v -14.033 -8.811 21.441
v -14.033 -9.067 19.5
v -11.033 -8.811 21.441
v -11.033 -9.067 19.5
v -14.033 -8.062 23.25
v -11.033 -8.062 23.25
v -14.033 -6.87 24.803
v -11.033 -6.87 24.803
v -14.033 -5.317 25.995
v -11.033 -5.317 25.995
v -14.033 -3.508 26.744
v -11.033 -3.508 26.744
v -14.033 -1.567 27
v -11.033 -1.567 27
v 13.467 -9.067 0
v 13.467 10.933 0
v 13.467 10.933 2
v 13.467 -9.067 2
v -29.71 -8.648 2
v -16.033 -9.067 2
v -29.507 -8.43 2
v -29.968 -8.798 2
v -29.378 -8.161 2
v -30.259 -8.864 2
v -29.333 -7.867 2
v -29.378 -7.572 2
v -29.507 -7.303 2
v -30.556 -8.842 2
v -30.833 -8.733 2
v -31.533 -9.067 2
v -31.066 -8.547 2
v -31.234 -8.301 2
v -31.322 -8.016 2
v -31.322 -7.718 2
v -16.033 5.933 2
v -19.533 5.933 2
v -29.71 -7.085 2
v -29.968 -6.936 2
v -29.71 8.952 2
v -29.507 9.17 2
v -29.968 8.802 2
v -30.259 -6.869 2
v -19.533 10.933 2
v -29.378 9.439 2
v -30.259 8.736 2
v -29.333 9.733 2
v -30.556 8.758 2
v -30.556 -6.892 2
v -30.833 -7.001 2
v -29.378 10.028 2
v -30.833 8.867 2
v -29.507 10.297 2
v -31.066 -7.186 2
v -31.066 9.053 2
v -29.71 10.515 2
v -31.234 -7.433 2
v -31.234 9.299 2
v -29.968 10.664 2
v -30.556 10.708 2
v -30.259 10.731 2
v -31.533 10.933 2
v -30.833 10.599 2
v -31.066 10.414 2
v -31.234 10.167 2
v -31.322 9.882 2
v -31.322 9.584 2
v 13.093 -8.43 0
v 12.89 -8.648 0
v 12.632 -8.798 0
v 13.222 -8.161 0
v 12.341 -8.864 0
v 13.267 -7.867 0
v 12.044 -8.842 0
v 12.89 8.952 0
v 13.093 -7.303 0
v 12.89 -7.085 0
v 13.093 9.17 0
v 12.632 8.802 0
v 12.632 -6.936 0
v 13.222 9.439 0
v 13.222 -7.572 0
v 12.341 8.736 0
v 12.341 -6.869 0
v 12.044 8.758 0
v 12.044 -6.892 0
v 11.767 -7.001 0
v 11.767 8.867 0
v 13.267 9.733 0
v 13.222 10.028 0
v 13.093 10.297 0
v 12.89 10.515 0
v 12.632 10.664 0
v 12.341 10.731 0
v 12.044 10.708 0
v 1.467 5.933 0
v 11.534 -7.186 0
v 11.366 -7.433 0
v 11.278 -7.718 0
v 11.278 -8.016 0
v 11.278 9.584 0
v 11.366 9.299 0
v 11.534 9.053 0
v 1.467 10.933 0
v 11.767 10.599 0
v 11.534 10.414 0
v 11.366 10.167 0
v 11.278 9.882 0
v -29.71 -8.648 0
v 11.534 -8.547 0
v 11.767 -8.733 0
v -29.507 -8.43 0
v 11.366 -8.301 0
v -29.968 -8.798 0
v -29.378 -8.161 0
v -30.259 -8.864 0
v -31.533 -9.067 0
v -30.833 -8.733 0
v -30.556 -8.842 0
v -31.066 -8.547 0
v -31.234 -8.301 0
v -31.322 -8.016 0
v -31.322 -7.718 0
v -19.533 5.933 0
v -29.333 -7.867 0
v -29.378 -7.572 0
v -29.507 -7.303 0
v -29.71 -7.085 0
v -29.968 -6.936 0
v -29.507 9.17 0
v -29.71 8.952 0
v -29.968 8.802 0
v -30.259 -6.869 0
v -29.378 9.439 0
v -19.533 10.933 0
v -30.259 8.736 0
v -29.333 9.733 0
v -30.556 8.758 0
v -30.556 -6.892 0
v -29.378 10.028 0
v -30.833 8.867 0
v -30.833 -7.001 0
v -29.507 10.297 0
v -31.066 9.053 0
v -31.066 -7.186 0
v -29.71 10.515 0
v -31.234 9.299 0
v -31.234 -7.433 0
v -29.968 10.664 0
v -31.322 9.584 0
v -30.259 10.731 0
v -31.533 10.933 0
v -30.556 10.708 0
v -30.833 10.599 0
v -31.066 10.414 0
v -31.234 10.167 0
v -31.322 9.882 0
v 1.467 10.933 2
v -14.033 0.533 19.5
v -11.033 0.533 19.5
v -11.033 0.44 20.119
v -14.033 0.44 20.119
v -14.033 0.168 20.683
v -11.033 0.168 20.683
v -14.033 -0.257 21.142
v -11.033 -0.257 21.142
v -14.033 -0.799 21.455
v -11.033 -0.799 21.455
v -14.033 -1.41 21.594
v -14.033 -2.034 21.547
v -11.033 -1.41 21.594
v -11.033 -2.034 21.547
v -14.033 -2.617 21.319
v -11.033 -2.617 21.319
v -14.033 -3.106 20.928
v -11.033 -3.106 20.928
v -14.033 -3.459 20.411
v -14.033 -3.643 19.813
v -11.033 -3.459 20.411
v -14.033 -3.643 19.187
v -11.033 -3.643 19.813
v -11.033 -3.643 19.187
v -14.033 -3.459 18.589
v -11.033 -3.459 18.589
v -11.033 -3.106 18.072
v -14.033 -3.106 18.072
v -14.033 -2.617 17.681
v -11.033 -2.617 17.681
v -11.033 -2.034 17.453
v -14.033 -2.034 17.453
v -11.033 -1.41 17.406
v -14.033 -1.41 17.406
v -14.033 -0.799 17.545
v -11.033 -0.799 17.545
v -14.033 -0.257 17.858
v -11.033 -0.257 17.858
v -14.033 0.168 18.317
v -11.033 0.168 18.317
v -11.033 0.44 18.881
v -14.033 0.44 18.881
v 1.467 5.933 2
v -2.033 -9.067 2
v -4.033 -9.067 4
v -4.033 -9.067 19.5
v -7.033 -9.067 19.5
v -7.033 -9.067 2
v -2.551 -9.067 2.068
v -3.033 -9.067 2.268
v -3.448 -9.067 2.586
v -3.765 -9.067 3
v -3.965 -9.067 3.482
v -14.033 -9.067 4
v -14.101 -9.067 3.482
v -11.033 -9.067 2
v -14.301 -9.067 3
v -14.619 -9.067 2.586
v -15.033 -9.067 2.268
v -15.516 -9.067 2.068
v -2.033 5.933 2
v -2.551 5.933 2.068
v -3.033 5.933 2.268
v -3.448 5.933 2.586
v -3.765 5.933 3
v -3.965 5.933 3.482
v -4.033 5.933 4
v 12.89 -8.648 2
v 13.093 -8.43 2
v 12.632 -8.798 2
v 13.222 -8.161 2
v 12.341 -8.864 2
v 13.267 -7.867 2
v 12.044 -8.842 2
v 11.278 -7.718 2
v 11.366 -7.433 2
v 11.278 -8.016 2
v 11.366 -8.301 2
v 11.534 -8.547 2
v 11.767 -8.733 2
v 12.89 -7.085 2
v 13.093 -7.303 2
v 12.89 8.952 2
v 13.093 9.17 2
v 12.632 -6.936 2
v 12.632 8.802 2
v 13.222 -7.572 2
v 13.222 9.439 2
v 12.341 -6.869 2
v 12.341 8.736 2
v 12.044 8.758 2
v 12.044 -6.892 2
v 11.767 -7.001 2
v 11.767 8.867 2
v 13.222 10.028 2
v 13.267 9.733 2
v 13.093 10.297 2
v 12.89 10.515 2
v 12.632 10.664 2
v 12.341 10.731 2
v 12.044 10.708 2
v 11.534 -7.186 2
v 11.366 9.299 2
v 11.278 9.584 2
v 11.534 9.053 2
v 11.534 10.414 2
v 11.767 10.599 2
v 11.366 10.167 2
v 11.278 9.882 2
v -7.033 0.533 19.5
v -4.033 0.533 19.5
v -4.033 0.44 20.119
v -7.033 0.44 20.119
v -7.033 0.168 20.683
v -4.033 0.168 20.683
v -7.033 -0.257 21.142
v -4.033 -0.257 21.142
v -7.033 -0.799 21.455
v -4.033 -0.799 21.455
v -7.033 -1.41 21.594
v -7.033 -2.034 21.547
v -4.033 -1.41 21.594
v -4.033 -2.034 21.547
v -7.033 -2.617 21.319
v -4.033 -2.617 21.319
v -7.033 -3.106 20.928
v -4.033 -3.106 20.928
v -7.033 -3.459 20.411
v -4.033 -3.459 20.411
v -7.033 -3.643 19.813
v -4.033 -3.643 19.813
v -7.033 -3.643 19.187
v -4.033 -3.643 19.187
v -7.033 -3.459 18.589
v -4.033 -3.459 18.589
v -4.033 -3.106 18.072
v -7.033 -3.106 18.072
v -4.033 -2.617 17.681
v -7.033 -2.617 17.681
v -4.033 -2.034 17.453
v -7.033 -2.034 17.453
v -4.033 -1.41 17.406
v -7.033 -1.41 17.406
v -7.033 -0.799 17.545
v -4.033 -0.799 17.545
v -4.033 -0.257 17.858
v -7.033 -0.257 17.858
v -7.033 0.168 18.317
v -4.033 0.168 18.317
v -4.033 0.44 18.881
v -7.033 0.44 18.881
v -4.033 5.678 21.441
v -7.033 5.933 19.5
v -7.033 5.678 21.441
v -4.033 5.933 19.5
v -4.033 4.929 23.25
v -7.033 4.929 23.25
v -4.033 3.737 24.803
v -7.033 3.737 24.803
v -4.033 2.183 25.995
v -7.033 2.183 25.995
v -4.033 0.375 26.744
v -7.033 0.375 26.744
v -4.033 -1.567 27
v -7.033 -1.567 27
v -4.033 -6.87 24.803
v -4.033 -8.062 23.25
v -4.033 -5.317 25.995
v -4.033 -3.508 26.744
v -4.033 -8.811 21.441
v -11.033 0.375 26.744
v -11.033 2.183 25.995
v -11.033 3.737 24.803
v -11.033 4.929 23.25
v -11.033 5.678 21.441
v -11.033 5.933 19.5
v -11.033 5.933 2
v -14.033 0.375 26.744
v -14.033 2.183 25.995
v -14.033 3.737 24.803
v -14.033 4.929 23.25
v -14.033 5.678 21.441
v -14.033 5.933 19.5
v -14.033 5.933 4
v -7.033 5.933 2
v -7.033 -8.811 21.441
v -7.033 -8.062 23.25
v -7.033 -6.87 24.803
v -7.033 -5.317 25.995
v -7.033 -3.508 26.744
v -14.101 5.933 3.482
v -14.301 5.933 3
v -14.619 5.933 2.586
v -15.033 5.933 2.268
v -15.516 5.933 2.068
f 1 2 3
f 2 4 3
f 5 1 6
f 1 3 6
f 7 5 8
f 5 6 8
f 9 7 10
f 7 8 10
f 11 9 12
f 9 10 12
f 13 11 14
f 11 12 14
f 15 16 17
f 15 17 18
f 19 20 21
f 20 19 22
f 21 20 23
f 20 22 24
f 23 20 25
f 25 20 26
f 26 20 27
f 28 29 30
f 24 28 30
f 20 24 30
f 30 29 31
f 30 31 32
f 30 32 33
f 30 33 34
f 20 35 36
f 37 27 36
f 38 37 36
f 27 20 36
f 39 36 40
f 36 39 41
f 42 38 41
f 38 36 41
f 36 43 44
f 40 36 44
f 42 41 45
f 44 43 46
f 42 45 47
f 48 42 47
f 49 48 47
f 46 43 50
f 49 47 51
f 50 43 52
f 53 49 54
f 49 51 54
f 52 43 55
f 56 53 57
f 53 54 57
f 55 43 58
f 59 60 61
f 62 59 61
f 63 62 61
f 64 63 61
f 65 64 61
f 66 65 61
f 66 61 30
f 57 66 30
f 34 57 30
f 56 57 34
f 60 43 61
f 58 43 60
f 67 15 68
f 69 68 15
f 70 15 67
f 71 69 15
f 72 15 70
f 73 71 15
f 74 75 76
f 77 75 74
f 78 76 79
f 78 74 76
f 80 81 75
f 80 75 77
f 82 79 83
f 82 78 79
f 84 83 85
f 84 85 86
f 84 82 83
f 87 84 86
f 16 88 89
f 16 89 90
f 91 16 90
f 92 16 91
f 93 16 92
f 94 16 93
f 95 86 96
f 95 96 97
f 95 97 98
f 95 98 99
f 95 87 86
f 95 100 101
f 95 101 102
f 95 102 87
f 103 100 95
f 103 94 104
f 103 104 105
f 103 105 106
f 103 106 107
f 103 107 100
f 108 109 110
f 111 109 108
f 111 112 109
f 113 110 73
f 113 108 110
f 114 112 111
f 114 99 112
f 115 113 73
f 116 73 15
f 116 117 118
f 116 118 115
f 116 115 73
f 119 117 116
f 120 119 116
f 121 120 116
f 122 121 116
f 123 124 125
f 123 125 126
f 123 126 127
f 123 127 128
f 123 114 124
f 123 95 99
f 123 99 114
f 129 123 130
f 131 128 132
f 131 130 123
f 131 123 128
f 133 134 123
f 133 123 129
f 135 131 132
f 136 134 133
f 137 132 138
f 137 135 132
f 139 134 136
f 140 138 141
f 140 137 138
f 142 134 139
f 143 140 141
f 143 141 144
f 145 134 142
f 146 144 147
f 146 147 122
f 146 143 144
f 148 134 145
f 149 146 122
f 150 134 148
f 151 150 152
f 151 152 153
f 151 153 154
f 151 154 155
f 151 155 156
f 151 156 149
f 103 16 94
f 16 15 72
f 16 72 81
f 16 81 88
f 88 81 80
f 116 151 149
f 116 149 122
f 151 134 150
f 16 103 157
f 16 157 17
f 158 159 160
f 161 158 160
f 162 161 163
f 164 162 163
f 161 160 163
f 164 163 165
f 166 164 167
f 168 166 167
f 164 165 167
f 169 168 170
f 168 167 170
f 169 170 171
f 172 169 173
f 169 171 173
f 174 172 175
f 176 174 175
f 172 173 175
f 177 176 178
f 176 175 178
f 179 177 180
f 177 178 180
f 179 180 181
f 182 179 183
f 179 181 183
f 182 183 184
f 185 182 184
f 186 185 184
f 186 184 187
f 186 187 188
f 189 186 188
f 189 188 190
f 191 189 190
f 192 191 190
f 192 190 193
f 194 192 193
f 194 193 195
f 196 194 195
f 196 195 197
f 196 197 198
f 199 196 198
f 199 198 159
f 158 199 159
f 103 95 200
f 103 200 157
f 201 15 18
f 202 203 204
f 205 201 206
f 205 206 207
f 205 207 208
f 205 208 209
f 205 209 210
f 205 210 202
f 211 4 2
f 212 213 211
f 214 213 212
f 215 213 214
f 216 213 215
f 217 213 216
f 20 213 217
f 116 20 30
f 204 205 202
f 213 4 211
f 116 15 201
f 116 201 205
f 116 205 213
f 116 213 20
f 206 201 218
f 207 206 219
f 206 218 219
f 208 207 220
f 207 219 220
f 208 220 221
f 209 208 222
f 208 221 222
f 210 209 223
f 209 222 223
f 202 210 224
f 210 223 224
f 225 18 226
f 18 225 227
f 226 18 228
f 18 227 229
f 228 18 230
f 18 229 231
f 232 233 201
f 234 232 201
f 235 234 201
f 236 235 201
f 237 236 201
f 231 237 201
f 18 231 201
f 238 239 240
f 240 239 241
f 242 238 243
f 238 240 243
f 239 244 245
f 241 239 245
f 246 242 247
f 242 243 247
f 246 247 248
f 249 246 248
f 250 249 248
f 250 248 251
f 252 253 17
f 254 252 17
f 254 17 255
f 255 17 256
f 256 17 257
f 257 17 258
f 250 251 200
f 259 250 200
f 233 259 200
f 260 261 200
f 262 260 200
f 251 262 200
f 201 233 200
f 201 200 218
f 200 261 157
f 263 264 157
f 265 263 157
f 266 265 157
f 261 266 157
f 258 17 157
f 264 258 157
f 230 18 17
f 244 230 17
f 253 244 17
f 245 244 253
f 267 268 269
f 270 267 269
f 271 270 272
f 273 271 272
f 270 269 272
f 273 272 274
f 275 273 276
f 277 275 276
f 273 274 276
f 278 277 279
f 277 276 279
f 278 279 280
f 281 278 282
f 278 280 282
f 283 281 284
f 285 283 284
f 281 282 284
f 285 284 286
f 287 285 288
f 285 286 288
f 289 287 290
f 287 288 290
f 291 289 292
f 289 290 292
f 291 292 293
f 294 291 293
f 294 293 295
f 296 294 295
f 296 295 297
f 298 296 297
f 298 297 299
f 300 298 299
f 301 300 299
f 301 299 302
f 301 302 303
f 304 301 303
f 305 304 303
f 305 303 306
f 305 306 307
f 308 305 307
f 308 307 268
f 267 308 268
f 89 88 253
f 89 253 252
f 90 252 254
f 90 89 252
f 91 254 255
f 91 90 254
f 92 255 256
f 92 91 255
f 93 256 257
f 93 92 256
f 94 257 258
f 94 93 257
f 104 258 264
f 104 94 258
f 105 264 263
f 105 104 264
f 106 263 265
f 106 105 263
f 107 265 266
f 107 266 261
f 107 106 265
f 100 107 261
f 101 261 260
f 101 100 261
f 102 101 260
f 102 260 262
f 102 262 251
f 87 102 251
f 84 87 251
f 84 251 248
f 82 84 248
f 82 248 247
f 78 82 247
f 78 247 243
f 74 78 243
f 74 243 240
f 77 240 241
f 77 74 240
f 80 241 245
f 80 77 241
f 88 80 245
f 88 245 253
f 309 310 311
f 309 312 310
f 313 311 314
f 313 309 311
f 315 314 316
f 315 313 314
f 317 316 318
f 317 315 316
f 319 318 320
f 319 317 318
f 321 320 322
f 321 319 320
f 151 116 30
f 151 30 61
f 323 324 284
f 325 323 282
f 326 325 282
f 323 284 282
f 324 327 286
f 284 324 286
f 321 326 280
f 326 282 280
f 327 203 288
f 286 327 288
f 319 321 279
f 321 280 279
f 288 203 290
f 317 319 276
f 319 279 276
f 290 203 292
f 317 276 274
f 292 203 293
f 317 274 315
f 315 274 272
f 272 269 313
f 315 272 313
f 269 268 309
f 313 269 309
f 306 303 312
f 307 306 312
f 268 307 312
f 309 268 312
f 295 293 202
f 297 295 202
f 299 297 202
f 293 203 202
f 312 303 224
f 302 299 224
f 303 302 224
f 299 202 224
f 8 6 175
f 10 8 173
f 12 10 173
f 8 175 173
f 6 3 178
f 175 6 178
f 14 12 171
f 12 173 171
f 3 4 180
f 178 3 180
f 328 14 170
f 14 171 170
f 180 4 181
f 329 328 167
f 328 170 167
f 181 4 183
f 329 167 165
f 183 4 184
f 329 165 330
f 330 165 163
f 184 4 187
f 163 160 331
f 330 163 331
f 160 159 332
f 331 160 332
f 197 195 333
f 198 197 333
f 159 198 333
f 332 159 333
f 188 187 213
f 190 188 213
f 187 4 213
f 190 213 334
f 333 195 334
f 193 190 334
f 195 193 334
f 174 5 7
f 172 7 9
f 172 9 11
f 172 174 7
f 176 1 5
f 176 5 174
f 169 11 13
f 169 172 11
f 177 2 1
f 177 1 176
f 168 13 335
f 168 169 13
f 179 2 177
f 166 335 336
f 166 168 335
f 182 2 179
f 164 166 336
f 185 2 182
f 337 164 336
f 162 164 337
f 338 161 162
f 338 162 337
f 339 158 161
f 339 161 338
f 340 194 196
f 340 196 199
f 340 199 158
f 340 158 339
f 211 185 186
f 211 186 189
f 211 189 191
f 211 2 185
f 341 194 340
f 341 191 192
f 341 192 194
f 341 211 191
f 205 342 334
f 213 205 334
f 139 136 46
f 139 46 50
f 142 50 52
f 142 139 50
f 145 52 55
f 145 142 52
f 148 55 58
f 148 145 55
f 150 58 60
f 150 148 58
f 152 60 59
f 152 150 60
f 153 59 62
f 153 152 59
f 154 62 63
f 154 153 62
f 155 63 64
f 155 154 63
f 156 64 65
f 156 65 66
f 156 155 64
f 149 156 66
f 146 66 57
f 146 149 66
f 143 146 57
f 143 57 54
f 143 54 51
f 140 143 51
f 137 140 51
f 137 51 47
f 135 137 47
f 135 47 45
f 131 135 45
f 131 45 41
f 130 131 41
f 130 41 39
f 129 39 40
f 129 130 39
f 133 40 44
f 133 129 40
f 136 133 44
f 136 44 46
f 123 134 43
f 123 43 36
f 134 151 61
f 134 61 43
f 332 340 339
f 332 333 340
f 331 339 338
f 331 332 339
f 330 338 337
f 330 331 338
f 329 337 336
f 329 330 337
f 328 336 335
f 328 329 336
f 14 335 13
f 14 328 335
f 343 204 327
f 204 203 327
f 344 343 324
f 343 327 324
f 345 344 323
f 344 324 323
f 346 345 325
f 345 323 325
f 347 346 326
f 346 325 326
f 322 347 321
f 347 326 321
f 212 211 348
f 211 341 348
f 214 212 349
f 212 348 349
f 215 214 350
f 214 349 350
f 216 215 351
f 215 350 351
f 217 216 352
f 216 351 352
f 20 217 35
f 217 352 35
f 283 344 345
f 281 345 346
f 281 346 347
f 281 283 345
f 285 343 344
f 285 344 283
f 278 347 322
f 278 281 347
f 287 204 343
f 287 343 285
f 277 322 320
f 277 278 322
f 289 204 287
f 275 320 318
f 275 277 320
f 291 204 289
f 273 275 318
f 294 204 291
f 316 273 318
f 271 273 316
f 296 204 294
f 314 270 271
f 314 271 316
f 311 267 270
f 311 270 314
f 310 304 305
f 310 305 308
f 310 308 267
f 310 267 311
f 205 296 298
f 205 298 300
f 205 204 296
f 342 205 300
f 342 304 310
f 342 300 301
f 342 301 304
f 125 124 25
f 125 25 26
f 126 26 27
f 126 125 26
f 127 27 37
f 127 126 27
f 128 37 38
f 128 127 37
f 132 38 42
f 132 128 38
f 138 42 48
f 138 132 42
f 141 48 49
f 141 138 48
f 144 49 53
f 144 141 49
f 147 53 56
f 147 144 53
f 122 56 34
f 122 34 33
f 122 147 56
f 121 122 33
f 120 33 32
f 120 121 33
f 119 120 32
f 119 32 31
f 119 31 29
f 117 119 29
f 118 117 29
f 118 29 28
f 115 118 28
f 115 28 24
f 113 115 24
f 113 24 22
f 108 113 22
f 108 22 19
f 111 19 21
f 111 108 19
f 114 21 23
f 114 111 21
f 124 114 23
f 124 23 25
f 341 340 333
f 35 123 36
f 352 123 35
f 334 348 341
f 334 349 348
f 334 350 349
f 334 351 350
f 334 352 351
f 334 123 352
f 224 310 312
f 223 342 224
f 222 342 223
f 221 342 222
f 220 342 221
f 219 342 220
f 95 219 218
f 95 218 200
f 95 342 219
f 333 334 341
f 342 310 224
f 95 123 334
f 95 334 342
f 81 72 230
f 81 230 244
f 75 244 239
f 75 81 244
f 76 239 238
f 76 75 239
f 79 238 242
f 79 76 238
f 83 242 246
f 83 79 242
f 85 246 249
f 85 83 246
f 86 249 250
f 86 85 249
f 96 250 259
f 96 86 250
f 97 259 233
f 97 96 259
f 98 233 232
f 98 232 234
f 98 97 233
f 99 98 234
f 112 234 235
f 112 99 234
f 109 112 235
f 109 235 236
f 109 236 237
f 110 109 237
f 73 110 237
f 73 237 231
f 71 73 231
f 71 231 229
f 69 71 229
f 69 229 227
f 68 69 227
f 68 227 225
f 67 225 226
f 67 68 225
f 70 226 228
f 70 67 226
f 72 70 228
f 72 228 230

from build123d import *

# Parameters (mm, degrees)
SKETCH_1_R          = 1
EXTRUDE_1_DEPTH     = 2
SKETCH_2_W          = 3
SKETCH_2_H          = 15
EXTRUDE_2_DEPTH     = 25
FILLET_1_R          = 7.5
SKETCH_3_R          = 2.1
CUT_EXTRUDE_1_DEPTH = 15
FILLET_2_R          = 2


with BuildPart() as part:
    # 草图1 → 凸台-拉伸1 (new body)
    with BuildSketch(Plane.XY):
        Polygon((1.466666667, 10.933333333), (13.466666667, 10.933333333), (13.466666667, -9.066666667), (-31.533333333, -9.066666667), (-31.533333333, 10.933333333), (-19.533333333, 10.933333333), (-19.533333333, 5.933333333), (1.466666667, 5.933333333), align=None)
        with Locations((-30.333333333, 9.733333333)):
            Circle(SKETCH_1_R, mode=Mode.SUBTRACT)
        with Locations((-30.333333333, -7.866666667)):
            Circle(SKETCH_1_R, mode=Mode.SUBTRACT)
        with Locations((12.266666667, 9.733333333)):
            Circle(SKETCH_1_R, mode=Mode.SUBTRACT)
        with Locations((12.266666667, -7.866666667)):
            Circle(SKETCH_1_R, mode=Mode.SUBTRACT)
    extrude(amount=EXTRUDE_1_DEPTH)

    # 草图2 → 凸台-拉伸2 (add)
    with BuildSketch(Plane.XY.offset(2)):
        with Locations((-12.533333333, -1.566666667)):
            Rectangle(SKETCH_2_W, SKETCH_2_H)
        with Locations((-5.533333333, -1.566666667)):
            Rectangle(SKETCH_2_W, SKETCH_2_H)
    extrude(amount=EXTRUDE_2_DEPTH)

    # 圆角1
    fillet_1_edges = [part.edges().sort_by_distance(p)[0] for p in [
        (-5.533333333, -9.066666667, 27),
        (-12.533333333, -9.066666667, 27),
        (-5.533333333, 5.933333333, 27),
        (-12.533333333, 5.933333333, 27),
    ]]
    fillet(fillet_1_edges, radius=FILLET_1_R - 0.0001)  # a hair under: the kernel refuses the full size

    # 草图3 → 切除-拉伸1 (cut)
    with BuildSketch(Plane(origin=(-4.033333333, 0, 0), x_dir=(0, 0, -1), z_dir=(1, 0, 0))):
        with Locations(Location((-19.5, -1.566666667, 0), (0, 0, 90))):
            Circle(SKETCH_3_R)
    extrude(amount=-CUT_EXTRUDE_1_DEPTH, mode=Mode.SUBTRACT)

    # 圆角2
    fillet_2_edges = [part.edges().sort_by_distance(p)[0] for p in [
        (-14.033333333, -1.566666667, 2),
        (-4.033333333, -1.566666667, 2),
    ]]
    fillet(fillet_2_edges, radius=FILLET_2_R)


solid = part.part
